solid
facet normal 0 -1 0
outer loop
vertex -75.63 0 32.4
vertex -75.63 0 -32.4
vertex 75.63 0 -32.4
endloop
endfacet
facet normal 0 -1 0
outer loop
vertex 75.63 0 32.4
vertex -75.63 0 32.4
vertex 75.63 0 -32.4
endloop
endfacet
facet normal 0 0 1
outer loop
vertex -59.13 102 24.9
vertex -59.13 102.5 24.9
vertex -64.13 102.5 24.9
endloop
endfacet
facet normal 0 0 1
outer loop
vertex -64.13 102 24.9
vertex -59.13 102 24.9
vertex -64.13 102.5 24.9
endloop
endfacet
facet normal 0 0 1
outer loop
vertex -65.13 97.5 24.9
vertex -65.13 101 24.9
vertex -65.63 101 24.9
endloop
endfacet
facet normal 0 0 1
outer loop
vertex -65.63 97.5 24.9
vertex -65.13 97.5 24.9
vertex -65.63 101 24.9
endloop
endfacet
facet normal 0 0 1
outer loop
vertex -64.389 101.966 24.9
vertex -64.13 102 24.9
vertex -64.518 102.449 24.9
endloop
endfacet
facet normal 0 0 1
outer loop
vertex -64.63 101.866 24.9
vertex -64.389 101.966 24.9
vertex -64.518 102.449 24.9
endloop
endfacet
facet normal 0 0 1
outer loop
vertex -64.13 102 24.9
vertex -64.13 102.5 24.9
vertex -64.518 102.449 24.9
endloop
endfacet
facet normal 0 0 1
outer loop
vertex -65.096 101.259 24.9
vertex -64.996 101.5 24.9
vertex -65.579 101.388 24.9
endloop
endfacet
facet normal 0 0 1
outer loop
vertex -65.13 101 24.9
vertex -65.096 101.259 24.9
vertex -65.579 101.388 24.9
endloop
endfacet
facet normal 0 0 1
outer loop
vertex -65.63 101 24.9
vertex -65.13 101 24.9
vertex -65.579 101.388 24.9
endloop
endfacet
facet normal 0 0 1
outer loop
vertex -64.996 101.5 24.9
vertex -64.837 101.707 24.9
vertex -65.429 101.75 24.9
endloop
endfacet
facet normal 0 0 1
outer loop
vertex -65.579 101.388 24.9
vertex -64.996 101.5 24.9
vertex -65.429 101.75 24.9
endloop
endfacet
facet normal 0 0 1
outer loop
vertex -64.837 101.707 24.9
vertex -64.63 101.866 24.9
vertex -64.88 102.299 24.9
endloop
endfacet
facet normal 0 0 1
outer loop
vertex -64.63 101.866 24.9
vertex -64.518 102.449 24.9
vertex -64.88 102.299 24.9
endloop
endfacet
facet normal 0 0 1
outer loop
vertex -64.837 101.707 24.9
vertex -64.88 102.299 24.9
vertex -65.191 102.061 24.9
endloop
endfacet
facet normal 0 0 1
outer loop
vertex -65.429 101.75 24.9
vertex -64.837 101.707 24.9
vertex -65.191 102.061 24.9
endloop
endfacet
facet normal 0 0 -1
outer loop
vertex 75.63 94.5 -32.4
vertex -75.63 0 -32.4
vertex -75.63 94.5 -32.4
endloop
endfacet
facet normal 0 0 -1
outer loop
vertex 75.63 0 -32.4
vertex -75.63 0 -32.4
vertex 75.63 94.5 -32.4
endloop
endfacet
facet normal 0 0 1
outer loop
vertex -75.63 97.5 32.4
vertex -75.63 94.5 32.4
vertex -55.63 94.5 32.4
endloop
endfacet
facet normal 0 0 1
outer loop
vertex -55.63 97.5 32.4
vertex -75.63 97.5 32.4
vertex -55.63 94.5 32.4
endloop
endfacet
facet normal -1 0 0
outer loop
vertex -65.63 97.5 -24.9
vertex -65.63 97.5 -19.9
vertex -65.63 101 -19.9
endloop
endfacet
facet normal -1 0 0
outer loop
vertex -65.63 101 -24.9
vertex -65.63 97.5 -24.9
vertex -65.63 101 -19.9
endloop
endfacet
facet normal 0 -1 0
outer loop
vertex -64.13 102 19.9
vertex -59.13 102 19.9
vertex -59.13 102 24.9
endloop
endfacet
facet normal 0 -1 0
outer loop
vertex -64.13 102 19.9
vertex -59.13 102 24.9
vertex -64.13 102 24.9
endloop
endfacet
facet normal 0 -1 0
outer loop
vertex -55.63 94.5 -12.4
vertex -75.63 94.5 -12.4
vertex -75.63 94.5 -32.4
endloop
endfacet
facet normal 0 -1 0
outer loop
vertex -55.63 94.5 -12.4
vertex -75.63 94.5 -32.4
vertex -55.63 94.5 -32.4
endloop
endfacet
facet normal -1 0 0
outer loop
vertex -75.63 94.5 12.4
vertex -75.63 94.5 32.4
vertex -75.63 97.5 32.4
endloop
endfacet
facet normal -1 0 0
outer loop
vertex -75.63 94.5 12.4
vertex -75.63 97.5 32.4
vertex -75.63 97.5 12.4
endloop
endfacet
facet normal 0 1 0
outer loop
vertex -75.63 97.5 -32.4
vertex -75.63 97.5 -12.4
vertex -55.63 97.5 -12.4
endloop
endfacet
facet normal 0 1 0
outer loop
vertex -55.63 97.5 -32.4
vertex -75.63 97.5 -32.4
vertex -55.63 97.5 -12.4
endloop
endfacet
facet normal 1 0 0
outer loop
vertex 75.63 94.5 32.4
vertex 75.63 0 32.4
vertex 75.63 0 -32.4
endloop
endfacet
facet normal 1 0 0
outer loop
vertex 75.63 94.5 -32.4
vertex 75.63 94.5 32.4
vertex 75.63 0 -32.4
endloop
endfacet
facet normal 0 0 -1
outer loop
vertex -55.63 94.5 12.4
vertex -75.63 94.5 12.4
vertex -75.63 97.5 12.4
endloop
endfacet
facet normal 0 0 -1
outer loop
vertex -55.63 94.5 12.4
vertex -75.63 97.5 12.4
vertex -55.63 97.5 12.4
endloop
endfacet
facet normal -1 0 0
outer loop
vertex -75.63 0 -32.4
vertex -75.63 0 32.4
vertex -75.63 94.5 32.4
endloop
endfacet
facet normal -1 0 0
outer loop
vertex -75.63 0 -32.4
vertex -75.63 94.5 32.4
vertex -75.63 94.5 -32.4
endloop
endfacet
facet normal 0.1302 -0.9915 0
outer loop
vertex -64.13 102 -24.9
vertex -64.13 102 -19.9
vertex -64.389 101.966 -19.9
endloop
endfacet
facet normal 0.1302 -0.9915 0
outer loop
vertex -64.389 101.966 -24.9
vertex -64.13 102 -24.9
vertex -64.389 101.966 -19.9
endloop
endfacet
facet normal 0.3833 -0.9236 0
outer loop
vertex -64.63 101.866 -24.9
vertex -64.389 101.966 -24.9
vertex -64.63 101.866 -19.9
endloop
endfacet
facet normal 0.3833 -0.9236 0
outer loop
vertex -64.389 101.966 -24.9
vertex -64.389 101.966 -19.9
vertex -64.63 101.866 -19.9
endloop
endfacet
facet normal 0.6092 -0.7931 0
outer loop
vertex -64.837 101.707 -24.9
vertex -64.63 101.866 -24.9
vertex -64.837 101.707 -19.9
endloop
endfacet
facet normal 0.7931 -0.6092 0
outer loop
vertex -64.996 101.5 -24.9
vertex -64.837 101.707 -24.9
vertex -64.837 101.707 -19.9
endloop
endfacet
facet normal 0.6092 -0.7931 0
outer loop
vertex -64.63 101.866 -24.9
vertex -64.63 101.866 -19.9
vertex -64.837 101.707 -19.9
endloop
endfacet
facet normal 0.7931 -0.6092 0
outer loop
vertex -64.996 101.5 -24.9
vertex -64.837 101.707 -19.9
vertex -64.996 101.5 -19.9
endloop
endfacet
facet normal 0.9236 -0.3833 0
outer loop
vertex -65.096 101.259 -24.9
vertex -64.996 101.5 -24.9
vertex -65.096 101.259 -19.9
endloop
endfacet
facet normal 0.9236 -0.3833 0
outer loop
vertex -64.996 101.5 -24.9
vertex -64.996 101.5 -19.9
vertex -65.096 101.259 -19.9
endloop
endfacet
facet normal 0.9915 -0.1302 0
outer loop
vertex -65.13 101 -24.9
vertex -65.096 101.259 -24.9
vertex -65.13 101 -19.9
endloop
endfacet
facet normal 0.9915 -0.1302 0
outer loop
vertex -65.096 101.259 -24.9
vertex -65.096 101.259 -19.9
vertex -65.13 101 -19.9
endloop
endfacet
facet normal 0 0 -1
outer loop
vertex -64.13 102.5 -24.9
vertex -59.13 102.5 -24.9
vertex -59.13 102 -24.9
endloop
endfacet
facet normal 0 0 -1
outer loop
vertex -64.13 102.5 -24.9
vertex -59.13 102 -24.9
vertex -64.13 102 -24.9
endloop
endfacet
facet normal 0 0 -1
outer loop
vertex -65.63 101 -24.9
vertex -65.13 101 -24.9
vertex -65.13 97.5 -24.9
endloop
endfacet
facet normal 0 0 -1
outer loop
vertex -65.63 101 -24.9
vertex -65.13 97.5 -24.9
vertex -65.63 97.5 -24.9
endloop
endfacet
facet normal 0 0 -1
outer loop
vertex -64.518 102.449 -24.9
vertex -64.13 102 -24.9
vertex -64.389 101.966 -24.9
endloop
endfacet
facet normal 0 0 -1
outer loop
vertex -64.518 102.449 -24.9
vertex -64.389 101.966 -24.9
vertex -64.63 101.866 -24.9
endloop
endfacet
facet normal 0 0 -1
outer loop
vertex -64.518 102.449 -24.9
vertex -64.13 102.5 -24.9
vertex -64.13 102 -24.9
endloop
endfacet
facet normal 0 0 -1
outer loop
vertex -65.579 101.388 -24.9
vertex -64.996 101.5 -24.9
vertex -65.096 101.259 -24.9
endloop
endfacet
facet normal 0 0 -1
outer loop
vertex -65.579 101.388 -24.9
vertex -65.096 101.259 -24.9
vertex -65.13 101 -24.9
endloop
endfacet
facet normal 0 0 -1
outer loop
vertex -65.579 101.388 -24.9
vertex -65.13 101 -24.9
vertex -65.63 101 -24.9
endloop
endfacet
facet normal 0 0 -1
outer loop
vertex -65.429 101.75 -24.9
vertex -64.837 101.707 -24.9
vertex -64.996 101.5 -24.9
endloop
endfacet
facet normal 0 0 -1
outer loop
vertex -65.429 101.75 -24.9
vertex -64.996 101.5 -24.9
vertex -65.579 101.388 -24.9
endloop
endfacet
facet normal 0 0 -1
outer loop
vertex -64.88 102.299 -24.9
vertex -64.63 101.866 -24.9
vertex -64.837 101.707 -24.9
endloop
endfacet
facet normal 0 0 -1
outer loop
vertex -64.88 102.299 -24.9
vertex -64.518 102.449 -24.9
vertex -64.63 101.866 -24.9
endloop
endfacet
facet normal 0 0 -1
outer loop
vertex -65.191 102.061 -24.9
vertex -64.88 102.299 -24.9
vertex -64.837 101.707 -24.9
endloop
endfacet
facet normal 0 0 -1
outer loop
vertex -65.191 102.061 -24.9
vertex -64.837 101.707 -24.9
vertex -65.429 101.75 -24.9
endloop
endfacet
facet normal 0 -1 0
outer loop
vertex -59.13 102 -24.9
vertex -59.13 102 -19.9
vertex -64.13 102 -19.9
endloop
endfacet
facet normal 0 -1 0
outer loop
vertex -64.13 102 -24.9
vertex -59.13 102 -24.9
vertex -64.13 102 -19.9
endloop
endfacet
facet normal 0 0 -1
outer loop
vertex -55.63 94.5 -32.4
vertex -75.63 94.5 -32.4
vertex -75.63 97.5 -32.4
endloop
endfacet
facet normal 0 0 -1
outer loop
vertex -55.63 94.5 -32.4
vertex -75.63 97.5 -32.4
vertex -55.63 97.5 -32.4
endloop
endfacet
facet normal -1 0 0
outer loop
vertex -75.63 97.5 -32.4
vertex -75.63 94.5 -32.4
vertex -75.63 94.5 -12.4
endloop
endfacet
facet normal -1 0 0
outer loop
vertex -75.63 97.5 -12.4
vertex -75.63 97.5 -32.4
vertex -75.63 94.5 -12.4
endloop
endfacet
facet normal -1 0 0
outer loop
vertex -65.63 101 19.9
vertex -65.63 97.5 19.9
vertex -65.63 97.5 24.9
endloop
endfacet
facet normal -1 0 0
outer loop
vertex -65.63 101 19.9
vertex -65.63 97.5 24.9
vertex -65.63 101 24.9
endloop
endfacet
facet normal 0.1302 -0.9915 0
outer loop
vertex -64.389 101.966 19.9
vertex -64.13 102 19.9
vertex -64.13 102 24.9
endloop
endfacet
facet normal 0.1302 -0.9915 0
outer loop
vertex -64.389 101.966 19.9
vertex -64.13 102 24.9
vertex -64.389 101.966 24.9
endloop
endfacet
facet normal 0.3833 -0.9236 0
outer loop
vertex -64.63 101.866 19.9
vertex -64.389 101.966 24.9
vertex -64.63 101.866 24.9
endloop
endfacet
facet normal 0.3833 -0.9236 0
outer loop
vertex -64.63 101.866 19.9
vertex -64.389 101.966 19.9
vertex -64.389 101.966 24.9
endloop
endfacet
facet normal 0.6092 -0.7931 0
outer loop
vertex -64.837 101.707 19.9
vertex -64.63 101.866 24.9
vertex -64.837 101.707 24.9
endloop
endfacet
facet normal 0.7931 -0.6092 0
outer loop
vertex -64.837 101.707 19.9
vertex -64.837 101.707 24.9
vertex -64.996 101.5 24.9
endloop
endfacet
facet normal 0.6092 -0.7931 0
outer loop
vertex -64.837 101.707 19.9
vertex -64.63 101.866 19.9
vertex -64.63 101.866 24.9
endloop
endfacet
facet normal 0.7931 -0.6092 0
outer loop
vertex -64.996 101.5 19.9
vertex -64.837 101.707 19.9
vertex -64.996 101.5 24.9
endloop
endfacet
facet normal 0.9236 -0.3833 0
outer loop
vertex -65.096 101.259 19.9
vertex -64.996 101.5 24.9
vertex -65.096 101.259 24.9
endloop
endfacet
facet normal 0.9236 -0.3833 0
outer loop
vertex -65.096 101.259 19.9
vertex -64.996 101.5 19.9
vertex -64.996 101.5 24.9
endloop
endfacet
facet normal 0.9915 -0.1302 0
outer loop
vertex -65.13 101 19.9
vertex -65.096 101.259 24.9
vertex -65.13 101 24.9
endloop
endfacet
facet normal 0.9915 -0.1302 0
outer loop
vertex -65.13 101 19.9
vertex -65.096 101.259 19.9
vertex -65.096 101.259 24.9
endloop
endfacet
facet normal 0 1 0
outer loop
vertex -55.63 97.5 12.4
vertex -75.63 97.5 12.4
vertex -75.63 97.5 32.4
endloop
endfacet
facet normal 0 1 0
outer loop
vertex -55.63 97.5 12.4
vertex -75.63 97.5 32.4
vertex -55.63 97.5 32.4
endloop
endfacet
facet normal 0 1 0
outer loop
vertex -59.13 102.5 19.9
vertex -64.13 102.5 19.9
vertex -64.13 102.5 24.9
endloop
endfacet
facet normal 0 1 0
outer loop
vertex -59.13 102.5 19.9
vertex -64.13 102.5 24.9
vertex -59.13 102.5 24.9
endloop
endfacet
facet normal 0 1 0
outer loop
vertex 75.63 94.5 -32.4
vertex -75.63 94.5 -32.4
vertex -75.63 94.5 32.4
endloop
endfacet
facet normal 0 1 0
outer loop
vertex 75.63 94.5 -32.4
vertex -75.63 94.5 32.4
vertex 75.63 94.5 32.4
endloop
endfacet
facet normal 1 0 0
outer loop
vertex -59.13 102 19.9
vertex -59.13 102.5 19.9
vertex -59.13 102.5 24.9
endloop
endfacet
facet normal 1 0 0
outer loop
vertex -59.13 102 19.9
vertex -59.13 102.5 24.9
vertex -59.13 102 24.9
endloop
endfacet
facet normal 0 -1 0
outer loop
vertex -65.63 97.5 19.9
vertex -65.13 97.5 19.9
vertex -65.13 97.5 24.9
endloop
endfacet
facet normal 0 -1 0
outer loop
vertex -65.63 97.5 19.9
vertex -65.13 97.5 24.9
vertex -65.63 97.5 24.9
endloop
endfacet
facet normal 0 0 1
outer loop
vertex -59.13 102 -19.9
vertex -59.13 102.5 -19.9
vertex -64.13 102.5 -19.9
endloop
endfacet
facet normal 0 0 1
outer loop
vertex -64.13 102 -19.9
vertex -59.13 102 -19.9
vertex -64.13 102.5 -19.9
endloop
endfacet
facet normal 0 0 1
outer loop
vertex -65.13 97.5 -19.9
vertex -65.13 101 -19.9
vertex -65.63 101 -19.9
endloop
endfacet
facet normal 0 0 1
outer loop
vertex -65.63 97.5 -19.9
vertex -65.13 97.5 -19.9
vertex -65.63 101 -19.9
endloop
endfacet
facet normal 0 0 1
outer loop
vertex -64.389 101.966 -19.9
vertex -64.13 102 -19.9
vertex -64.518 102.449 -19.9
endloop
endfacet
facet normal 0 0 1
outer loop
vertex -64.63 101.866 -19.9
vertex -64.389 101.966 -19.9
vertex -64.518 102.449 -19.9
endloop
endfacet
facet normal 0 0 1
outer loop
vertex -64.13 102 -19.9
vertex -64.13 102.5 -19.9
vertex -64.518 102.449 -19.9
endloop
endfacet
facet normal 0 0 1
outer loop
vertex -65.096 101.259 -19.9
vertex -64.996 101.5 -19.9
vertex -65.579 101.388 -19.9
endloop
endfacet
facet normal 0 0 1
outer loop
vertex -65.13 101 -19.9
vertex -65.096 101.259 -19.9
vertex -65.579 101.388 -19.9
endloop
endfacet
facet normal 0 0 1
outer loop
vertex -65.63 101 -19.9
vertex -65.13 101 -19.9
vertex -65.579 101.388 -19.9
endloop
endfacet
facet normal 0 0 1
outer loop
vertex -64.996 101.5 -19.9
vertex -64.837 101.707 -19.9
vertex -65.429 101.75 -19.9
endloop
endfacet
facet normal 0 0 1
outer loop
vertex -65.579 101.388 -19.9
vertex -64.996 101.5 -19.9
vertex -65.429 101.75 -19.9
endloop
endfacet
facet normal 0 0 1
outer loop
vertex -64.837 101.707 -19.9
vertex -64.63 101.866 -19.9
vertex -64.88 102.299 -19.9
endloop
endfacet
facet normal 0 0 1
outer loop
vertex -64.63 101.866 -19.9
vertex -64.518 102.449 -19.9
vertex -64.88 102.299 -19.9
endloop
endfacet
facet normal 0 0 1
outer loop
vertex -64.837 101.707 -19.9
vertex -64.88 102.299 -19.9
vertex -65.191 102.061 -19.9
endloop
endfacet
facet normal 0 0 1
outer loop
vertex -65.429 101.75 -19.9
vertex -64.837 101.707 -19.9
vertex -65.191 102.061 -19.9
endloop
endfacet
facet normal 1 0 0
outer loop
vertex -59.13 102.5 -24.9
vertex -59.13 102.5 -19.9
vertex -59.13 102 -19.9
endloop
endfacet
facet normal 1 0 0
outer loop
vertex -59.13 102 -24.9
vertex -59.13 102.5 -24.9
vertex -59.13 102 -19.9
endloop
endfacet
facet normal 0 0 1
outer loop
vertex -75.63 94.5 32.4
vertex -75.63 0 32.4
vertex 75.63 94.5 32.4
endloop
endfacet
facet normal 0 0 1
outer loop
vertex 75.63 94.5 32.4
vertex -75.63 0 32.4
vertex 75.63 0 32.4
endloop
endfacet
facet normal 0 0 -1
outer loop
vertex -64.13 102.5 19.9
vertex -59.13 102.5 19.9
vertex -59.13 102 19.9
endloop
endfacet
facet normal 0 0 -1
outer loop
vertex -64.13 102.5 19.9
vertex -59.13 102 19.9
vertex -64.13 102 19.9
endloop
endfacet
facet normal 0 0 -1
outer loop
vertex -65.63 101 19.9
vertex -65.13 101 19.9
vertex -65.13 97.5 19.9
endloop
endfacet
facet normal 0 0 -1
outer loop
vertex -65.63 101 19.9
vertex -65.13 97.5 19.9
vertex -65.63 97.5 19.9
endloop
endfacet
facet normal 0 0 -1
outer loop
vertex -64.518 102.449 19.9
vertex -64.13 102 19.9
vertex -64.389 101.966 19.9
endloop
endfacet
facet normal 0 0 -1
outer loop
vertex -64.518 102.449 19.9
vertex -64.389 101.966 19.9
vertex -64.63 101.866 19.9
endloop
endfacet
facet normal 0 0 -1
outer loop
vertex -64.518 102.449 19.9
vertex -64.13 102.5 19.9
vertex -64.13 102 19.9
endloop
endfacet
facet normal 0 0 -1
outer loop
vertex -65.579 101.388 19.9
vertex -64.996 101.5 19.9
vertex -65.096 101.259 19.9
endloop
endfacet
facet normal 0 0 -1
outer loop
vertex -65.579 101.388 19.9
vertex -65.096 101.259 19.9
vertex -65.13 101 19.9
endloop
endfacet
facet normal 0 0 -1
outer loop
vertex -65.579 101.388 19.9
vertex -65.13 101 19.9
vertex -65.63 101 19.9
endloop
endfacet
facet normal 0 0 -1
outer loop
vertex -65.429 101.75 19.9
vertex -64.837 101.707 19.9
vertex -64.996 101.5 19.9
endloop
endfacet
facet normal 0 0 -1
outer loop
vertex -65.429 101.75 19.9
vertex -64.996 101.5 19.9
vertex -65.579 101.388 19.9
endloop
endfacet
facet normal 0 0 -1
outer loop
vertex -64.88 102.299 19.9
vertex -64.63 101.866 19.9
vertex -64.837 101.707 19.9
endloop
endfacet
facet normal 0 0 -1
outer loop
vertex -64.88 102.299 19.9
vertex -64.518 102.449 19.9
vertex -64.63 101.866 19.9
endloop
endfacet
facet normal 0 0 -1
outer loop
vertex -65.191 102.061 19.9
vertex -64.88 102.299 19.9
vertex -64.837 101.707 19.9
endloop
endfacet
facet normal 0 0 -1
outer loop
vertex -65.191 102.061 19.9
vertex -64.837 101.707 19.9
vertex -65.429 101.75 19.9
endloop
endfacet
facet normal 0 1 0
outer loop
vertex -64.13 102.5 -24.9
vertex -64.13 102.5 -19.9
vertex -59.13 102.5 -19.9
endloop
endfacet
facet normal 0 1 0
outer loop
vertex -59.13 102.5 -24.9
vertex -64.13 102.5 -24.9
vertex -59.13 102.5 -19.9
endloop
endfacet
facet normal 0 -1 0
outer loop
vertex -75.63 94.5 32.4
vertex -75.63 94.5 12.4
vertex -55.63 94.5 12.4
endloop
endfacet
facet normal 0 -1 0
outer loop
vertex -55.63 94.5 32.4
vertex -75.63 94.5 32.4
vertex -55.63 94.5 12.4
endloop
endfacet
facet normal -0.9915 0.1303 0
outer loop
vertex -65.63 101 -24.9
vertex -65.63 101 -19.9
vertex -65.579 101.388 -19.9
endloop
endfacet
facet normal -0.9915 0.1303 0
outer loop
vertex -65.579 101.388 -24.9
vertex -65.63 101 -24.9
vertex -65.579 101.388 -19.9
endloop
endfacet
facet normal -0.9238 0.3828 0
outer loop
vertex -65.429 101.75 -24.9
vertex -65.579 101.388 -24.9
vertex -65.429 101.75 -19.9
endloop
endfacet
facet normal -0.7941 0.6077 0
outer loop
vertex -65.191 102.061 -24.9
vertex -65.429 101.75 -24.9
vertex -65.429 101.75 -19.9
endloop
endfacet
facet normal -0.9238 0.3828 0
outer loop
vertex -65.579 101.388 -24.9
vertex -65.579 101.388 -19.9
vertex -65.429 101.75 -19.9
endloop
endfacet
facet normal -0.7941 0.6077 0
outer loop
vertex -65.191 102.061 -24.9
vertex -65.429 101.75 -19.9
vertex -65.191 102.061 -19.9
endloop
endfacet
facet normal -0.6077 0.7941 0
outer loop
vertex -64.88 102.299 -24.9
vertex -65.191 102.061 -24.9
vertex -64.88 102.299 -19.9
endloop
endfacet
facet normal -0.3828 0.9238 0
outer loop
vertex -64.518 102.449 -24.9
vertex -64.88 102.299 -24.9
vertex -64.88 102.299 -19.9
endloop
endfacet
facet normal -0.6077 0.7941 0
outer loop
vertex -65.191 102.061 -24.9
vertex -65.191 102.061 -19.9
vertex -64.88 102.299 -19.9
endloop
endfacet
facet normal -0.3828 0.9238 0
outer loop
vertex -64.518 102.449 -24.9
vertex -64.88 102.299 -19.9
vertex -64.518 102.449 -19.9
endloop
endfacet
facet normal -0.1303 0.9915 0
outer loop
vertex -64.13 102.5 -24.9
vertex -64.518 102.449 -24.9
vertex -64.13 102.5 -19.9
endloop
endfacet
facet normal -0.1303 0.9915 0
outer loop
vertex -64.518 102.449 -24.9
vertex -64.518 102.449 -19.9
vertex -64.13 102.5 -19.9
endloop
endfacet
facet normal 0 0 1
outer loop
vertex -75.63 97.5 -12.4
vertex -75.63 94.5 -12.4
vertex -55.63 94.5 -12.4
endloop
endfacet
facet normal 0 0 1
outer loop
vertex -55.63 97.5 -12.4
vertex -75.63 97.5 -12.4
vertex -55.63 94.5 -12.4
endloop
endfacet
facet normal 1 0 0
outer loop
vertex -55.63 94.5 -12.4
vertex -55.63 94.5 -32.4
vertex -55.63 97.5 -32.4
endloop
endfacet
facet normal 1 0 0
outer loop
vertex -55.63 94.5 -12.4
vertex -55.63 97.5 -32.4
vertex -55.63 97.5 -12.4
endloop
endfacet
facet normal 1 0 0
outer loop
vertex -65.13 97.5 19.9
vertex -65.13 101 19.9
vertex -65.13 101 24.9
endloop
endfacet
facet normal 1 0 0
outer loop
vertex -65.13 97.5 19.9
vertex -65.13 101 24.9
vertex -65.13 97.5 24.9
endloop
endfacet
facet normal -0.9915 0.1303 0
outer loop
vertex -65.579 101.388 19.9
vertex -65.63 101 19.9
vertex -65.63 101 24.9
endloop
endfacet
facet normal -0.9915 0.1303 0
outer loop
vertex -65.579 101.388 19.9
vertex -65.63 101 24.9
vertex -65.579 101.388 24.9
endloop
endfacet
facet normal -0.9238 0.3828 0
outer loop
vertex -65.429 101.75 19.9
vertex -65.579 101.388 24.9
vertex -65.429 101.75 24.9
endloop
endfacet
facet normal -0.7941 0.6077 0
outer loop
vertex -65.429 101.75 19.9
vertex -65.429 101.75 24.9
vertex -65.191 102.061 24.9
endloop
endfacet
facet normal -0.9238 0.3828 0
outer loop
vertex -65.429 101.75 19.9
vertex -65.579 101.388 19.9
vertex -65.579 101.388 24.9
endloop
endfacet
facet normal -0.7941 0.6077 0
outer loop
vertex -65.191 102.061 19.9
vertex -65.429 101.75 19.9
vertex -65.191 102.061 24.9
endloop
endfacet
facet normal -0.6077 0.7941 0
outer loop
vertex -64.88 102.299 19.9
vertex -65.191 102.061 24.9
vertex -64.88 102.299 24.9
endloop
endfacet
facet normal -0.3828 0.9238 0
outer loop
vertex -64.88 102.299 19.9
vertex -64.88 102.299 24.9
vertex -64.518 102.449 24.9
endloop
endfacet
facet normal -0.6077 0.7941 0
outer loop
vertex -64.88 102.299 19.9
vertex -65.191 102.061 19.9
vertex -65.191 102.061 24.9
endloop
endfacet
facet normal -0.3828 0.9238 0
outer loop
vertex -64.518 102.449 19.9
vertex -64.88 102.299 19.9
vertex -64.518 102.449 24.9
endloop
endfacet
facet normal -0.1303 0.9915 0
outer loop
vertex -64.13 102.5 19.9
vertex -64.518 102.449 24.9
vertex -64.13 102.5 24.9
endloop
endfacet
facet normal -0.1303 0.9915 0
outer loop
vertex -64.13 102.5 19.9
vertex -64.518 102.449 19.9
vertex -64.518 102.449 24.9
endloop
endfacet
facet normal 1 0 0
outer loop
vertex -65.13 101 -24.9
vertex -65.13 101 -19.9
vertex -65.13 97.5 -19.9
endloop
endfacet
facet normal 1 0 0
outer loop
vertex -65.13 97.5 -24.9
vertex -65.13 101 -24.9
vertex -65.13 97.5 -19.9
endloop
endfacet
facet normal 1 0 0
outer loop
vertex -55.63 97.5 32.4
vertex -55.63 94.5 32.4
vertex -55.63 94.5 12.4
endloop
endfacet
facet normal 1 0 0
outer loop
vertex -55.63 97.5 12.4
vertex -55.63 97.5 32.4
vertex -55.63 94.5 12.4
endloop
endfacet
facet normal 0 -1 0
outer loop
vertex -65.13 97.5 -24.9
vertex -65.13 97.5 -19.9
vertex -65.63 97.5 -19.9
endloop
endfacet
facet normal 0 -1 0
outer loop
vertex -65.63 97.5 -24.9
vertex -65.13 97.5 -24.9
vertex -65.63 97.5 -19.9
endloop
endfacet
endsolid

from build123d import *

# Parameters (mm, degrees)
SKETCH1_W                = 151.26
SKETCH1_H                = 64.8
BOSS_EXTRUDE1_DEPTH      = 94.5
SKETCH2_W                = 20
SKETCH2_H                = 20
BOSS_EXTRUDE2_DEPTH      = 3
BOSS_EXTRUDE3_DEPTH      = 2.5
BOSS_EXTRUDE3_DEPTH_BACK = 2.5


with BuildPart() as part:
    # Sketch1 → Boss-Extrude1 (new body)
    with BuildSketch(Plane(origin=(0, 0, 0), x_dir=(1, 0, 0), z_dir=(0, 1, 0))):
        Rectangle(SKETCH1_W, SKETCH1_H)
    extrude(amount=BOSS_EXTRUDE1_DEPTH)


with BuildPart() as body_2:
    # Sketch2 → Boss-Extrude2 (new body)
    with BuildSketch(Plane(origin=(0, 94.5, 0), x_dir=(1, 0, 0), z_dir=(0, 1, 0))):
        with Locations((-65.63, -22.4)):
            Rectangle(SKETCH2_W, SKETCH2_H)
    extrude(amount=BOSS_EXTRUDE2_DEPTH)


with BuildPart() as body_3:
    # Sketch3 → Boss-Extrude3 (new, two sides: drawn at the far end of the back side and taken through both)
    with BuildSketch(Plane.XY.offset(22.4).offset(-BOSS_EXTRUDE3_DEPTH_BACK)):
        with BuildLine():
            Line((-65.63, 97.5), (-65.63, 101))
            ThreePointArc((-65.63, 101), (-65.190660172, 102.060660172), (-64.13, 102.5))
            Line((-64.13, 102.5), (-59.13, 102.5))
            Line((-59.13, 102.5), (-59.13, 102))
            Line((-59.13, 102), (-64.13, 102))
            ThreePointArc((-64.13, 102), (-64.837106781, 101.707106781), (-65.13, 101))
            Line((-65.13, 101), (-65.13, 97.5))
            Line((-65.13, 97.5), (-65.63, 97.5))
        make_face()
    extrude(amount=BOSS_EXTRUDE3_DEPTH + BOSS_EXTRUDE3_DEPTH_BACK)


with BuildPart() as body_4:
    # Mirror1: mirrored copy
    add(body_3.part.mirror(Plane.XY))


with BuildPart() as body_5:
    # Mirror1 2: mirrored copy
    add(body_2.part.mirror(Plane.XY))


solid = Compound([part.part, body_2.part, body_3.part, body_4.part, body_5.part])
